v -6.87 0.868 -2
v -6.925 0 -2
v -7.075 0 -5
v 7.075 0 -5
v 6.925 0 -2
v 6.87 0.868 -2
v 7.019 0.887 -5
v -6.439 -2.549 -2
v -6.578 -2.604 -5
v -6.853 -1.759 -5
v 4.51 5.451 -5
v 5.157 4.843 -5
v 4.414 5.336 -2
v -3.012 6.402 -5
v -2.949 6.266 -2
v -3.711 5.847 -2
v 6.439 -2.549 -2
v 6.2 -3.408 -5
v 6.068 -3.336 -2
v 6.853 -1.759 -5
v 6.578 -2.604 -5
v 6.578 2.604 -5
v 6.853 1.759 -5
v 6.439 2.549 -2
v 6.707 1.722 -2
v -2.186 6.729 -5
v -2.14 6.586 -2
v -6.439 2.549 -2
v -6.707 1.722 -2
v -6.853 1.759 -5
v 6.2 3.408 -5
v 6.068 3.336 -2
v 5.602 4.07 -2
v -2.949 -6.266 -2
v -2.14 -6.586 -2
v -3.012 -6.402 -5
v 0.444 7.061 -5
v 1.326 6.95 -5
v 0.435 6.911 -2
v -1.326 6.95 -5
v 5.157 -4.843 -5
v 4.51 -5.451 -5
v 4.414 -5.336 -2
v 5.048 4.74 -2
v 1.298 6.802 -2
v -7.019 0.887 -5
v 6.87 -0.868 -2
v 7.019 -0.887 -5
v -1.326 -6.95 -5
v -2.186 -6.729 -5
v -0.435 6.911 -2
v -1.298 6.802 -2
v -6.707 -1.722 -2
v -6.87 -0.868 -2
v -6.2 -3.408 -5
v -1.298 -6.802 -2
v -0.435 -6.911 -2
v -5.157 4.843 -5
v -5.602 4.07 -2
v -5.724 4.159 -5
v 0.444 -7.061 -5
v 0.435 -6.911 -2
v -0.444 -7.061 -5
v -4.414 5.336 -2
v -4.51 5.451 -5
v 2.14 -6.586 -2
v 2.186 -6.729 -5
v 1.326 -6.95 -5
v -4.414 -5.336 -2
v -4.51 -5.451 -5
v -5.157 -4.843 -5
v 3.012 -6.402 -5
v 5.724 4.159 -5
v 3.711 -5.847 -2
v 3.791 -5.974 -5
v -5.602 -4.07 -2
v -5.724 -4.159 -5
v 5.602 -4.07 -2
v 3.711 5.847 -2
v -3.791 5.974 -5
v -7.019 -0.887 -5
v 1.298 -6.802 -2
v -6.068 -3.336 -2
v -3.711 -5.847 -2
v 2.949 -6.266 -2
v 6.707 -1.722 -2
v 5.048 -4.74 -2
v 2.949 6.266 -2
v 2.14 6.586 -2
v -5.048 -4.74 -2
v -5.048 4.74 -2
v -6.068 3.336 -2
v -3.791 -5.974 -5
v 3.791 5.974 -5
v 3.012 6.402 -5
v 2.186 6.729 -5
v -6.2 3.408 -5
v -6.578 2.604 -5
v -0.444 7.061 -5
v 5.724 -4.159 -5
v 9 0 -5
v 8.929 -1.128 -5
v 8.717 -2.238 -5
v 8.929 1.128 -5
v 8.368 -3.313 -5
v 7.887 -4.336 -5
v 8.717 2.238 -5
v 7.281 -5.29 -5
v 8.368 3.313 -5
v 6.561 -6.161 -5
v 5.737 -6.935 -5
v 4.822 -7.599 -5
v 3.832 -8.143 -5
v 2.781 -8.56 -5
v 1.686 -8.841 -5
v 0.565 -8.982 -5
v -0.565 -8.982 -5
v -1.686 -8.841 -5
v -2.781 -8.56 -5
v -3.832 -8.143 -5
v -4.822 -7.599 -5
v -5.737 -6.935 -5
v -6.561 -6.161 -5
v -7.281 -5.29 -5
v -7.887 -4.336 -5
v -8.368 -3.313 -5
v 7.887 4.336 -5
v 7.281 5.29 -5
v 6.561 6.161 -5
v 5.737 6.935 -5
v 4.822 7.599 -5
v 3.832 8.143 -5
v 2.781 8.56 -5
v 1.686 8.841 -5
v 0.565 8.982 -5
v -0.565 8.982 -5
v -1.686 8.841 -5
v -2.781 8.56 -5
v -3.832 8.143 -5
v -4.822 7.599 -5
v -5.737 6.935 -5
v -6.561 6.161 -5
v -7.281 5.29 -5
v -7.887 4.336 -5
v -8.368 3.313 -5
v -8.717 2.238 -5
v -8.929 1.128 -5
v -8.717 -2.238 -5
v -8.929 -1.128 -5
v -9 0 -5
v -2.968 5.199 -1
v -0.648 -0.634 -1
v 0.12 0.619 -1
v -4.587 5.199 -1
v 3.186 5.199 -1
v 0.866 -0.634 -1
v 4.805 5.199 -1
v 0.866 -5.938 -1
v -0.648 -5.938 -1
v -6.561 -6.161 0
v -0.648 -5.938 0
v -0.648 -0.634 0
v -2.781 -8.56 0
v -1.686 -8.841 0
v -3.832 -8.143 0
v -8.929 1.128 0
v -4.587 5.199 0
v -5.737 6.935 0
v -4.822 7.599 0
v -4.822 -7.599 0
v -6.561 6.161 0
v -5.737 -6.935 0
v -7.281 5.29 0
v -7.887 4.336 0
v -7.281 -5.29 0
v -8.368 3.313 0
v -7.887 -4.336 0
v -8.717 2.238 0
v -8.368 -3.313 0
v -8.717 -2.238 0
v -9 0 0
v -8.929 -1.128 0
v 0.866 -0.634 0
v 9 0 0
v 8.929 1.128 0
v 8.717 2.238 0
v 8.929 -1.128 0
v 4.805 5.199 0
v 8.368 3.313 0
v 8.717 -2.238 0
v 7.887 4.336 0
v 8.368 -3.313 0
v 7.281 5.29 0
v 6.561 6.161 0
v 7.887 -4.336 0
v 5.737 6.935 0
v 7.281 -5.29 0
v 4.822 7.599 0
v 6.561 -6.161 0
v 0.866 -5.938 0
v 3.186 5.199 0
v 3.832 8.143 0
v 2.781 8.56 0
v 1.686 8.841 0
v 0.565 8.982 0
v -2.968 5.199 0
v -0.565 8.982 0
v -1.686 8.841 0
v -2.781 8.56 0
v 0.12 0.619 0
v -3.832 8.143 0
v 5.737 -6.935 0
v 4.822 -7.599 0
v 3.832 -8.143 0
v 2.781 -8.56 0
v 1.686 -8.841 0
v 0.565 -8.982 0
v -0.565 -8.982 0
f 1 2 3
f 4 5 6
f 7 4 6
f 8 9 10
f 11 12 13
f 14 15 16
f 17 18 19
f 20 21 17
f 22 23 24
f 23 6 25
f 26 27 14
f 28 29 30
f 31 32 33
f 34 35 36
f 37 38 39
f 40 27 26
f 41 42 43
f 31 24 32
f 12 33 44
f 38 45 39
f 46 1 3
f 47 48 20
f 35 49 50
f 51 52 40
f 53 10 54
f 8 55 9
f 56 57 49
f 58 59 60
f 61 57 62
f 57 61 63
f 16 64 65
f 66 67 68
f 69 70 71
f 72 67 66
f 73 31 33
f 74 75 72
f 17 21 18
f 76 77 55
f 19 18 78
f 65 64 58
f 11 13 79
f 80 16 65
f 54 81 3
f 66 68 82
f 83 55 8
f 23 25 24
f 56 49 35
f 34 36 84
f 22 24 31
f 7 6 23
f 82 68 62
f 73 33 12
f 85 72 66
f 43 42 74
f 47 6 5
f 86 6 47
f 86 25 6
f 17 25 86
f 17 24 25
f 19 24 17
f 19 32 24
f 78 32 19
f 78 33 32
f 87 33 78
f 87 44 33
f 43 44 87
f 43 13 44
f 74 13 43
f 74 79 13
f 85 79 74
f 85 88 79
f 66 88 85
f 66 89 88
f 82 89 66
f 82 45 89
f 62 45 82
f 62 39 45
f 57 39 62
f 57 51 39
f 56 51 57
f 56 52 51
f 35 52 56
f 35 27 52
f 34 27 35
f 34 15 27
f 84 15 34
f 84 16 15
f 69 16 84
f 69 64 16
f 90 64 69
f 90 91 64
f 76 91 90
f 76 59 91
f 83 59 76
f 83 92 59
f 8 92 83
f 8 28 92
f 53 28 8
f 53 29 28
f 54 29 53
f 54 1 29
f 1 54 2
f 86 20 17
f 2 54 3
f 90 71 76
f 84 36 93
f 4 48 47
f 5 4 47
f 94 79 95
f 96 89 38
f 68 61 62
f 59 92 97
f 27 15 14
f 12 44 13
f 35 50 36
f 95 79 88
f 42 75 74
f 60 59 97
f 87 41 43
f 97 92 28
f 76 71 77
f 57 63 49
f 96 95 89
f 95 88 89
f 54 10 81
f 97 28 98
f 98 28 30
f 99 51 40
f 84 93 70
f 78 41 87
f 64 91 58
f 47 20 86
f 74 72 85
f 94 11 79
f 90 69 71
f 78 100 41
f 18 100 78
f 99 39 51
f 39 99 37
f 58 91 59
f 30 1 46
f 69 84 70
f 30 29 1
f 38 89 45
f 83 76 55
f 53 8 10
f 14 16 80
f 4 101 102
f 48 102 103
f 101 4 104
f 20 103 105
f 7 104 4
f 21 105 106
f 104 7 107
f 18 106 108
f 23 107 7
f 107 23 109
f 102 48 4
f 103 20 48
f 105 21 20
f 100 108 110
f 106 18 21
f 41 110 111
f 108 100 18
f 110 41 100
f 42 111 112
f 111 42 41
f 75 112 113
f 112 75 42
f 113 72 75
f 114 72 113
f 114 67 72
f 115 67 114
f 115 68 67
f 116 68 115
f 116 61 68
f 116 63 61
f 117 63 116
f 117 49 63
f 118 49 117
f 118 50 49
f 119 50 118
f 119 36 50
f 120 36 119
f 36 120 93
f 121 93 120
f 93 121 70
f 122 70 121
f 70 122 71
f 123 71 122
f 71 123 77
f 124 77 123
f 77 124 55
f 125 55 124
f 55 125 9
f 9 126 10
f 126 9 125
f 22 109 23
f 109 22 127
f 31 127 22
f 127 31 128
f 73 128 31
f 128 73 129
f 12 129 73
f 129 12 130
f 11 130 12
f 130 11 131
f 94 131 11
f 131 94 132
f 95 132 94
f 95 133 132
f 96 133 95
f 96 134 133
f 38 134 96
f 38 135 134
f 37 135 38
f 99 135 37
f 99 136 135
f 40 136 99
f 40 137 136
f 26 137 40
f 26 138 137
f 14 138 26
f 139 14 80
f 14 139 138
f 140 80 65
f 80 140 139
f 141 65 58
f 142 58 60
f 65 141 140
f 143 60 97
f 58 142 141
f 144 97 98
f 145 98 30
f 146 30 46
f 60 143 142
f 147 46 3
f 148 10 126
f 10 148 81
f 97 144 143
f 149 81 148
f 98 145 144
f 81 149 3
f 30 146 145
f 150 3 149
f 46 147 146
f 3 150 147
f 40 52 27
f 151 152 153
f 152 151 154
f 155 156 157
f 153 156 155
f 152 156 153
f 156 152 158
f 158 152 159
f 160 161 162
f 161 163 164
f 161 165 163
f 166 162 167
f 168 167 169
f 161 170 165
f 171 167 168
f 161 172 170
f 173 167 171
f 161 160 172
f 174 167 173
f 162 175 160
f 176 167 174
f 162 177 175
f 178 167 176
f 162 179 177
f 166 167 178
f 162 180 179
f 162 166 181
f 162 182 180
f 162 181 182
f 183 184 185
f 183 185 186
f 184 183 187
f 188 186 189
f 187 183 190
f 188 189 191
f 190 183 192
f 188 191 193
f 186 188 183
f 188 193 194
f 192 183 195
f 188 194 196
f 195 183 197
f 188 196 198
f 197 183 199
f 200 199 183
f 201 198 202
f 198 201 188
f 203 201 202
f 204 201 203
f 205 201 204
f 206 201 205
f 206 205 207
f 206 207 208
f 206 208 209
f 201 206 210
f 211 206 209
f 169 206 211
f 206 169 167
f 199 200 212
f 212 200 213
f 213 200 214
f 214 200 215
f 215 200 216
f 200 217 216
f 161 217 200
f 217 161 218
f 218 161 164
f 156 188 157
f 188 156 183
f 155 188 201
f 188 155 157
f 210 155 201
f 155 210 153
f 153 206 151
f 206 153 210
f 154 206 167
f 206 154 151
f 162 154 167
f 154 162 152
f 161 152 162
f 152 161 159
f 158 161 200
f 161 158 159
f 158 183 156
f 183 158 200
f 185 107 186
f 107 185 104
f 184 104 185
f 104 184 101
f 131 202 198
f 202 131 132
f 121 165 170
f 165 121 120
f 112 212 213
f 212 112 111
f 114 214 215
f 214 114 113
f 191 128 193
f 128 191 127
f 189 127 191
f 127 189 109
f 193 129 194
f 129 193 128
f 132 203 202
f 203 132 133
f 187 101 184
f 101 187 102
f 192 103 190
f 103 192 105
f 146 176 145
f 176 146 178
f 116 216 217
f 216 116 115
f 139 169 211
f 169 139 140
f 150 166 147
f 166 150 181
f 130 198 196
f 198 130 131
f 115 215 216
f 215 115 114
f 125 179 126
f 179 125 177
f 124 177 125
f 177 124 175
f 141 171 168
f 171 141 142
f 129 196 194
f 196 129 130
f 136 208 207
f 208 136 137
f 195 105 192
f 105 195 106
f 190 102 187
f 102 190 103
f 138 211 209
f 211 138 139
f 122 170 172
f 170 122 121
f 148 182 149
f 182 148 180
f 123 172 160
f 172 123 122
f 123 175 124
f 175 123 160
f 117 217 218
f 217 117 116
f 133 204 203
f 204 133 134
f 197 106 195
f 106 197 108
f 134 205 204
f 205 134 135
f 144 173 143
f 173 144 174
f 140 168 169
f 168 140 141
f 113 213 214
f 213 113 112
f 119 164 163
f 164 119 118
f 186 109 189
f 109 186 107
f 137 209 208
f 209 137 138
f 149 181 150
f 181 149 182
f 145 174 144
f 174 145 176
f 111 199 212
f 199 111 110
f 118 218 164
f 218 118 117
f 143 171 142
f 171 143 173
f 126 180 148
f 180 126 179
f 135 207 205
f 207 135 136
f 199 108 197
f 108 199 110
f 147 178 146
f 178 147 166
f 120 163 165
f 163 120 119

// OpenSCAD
$fn = 50;


difference() {
	union() {
		translate(v = [0, 0, -5.0000000000]) {
			cylinder(h = 5, r = 9.0000000000);
		}
	}
	union() {
		#translate(v = [0, 0, -5.0000000000]) {
			cylinder(h = 3, r1 = 7.0750000000, r2 = 6.9250000000);
		}
		translate(v = [0, -0.5000000000, -1]) {
			linear_extrude(height = 1) {
				text(font = "Webdings", halign = "center", size = 11, text = "Y", valign = "center");
			}
		}
	}
}
